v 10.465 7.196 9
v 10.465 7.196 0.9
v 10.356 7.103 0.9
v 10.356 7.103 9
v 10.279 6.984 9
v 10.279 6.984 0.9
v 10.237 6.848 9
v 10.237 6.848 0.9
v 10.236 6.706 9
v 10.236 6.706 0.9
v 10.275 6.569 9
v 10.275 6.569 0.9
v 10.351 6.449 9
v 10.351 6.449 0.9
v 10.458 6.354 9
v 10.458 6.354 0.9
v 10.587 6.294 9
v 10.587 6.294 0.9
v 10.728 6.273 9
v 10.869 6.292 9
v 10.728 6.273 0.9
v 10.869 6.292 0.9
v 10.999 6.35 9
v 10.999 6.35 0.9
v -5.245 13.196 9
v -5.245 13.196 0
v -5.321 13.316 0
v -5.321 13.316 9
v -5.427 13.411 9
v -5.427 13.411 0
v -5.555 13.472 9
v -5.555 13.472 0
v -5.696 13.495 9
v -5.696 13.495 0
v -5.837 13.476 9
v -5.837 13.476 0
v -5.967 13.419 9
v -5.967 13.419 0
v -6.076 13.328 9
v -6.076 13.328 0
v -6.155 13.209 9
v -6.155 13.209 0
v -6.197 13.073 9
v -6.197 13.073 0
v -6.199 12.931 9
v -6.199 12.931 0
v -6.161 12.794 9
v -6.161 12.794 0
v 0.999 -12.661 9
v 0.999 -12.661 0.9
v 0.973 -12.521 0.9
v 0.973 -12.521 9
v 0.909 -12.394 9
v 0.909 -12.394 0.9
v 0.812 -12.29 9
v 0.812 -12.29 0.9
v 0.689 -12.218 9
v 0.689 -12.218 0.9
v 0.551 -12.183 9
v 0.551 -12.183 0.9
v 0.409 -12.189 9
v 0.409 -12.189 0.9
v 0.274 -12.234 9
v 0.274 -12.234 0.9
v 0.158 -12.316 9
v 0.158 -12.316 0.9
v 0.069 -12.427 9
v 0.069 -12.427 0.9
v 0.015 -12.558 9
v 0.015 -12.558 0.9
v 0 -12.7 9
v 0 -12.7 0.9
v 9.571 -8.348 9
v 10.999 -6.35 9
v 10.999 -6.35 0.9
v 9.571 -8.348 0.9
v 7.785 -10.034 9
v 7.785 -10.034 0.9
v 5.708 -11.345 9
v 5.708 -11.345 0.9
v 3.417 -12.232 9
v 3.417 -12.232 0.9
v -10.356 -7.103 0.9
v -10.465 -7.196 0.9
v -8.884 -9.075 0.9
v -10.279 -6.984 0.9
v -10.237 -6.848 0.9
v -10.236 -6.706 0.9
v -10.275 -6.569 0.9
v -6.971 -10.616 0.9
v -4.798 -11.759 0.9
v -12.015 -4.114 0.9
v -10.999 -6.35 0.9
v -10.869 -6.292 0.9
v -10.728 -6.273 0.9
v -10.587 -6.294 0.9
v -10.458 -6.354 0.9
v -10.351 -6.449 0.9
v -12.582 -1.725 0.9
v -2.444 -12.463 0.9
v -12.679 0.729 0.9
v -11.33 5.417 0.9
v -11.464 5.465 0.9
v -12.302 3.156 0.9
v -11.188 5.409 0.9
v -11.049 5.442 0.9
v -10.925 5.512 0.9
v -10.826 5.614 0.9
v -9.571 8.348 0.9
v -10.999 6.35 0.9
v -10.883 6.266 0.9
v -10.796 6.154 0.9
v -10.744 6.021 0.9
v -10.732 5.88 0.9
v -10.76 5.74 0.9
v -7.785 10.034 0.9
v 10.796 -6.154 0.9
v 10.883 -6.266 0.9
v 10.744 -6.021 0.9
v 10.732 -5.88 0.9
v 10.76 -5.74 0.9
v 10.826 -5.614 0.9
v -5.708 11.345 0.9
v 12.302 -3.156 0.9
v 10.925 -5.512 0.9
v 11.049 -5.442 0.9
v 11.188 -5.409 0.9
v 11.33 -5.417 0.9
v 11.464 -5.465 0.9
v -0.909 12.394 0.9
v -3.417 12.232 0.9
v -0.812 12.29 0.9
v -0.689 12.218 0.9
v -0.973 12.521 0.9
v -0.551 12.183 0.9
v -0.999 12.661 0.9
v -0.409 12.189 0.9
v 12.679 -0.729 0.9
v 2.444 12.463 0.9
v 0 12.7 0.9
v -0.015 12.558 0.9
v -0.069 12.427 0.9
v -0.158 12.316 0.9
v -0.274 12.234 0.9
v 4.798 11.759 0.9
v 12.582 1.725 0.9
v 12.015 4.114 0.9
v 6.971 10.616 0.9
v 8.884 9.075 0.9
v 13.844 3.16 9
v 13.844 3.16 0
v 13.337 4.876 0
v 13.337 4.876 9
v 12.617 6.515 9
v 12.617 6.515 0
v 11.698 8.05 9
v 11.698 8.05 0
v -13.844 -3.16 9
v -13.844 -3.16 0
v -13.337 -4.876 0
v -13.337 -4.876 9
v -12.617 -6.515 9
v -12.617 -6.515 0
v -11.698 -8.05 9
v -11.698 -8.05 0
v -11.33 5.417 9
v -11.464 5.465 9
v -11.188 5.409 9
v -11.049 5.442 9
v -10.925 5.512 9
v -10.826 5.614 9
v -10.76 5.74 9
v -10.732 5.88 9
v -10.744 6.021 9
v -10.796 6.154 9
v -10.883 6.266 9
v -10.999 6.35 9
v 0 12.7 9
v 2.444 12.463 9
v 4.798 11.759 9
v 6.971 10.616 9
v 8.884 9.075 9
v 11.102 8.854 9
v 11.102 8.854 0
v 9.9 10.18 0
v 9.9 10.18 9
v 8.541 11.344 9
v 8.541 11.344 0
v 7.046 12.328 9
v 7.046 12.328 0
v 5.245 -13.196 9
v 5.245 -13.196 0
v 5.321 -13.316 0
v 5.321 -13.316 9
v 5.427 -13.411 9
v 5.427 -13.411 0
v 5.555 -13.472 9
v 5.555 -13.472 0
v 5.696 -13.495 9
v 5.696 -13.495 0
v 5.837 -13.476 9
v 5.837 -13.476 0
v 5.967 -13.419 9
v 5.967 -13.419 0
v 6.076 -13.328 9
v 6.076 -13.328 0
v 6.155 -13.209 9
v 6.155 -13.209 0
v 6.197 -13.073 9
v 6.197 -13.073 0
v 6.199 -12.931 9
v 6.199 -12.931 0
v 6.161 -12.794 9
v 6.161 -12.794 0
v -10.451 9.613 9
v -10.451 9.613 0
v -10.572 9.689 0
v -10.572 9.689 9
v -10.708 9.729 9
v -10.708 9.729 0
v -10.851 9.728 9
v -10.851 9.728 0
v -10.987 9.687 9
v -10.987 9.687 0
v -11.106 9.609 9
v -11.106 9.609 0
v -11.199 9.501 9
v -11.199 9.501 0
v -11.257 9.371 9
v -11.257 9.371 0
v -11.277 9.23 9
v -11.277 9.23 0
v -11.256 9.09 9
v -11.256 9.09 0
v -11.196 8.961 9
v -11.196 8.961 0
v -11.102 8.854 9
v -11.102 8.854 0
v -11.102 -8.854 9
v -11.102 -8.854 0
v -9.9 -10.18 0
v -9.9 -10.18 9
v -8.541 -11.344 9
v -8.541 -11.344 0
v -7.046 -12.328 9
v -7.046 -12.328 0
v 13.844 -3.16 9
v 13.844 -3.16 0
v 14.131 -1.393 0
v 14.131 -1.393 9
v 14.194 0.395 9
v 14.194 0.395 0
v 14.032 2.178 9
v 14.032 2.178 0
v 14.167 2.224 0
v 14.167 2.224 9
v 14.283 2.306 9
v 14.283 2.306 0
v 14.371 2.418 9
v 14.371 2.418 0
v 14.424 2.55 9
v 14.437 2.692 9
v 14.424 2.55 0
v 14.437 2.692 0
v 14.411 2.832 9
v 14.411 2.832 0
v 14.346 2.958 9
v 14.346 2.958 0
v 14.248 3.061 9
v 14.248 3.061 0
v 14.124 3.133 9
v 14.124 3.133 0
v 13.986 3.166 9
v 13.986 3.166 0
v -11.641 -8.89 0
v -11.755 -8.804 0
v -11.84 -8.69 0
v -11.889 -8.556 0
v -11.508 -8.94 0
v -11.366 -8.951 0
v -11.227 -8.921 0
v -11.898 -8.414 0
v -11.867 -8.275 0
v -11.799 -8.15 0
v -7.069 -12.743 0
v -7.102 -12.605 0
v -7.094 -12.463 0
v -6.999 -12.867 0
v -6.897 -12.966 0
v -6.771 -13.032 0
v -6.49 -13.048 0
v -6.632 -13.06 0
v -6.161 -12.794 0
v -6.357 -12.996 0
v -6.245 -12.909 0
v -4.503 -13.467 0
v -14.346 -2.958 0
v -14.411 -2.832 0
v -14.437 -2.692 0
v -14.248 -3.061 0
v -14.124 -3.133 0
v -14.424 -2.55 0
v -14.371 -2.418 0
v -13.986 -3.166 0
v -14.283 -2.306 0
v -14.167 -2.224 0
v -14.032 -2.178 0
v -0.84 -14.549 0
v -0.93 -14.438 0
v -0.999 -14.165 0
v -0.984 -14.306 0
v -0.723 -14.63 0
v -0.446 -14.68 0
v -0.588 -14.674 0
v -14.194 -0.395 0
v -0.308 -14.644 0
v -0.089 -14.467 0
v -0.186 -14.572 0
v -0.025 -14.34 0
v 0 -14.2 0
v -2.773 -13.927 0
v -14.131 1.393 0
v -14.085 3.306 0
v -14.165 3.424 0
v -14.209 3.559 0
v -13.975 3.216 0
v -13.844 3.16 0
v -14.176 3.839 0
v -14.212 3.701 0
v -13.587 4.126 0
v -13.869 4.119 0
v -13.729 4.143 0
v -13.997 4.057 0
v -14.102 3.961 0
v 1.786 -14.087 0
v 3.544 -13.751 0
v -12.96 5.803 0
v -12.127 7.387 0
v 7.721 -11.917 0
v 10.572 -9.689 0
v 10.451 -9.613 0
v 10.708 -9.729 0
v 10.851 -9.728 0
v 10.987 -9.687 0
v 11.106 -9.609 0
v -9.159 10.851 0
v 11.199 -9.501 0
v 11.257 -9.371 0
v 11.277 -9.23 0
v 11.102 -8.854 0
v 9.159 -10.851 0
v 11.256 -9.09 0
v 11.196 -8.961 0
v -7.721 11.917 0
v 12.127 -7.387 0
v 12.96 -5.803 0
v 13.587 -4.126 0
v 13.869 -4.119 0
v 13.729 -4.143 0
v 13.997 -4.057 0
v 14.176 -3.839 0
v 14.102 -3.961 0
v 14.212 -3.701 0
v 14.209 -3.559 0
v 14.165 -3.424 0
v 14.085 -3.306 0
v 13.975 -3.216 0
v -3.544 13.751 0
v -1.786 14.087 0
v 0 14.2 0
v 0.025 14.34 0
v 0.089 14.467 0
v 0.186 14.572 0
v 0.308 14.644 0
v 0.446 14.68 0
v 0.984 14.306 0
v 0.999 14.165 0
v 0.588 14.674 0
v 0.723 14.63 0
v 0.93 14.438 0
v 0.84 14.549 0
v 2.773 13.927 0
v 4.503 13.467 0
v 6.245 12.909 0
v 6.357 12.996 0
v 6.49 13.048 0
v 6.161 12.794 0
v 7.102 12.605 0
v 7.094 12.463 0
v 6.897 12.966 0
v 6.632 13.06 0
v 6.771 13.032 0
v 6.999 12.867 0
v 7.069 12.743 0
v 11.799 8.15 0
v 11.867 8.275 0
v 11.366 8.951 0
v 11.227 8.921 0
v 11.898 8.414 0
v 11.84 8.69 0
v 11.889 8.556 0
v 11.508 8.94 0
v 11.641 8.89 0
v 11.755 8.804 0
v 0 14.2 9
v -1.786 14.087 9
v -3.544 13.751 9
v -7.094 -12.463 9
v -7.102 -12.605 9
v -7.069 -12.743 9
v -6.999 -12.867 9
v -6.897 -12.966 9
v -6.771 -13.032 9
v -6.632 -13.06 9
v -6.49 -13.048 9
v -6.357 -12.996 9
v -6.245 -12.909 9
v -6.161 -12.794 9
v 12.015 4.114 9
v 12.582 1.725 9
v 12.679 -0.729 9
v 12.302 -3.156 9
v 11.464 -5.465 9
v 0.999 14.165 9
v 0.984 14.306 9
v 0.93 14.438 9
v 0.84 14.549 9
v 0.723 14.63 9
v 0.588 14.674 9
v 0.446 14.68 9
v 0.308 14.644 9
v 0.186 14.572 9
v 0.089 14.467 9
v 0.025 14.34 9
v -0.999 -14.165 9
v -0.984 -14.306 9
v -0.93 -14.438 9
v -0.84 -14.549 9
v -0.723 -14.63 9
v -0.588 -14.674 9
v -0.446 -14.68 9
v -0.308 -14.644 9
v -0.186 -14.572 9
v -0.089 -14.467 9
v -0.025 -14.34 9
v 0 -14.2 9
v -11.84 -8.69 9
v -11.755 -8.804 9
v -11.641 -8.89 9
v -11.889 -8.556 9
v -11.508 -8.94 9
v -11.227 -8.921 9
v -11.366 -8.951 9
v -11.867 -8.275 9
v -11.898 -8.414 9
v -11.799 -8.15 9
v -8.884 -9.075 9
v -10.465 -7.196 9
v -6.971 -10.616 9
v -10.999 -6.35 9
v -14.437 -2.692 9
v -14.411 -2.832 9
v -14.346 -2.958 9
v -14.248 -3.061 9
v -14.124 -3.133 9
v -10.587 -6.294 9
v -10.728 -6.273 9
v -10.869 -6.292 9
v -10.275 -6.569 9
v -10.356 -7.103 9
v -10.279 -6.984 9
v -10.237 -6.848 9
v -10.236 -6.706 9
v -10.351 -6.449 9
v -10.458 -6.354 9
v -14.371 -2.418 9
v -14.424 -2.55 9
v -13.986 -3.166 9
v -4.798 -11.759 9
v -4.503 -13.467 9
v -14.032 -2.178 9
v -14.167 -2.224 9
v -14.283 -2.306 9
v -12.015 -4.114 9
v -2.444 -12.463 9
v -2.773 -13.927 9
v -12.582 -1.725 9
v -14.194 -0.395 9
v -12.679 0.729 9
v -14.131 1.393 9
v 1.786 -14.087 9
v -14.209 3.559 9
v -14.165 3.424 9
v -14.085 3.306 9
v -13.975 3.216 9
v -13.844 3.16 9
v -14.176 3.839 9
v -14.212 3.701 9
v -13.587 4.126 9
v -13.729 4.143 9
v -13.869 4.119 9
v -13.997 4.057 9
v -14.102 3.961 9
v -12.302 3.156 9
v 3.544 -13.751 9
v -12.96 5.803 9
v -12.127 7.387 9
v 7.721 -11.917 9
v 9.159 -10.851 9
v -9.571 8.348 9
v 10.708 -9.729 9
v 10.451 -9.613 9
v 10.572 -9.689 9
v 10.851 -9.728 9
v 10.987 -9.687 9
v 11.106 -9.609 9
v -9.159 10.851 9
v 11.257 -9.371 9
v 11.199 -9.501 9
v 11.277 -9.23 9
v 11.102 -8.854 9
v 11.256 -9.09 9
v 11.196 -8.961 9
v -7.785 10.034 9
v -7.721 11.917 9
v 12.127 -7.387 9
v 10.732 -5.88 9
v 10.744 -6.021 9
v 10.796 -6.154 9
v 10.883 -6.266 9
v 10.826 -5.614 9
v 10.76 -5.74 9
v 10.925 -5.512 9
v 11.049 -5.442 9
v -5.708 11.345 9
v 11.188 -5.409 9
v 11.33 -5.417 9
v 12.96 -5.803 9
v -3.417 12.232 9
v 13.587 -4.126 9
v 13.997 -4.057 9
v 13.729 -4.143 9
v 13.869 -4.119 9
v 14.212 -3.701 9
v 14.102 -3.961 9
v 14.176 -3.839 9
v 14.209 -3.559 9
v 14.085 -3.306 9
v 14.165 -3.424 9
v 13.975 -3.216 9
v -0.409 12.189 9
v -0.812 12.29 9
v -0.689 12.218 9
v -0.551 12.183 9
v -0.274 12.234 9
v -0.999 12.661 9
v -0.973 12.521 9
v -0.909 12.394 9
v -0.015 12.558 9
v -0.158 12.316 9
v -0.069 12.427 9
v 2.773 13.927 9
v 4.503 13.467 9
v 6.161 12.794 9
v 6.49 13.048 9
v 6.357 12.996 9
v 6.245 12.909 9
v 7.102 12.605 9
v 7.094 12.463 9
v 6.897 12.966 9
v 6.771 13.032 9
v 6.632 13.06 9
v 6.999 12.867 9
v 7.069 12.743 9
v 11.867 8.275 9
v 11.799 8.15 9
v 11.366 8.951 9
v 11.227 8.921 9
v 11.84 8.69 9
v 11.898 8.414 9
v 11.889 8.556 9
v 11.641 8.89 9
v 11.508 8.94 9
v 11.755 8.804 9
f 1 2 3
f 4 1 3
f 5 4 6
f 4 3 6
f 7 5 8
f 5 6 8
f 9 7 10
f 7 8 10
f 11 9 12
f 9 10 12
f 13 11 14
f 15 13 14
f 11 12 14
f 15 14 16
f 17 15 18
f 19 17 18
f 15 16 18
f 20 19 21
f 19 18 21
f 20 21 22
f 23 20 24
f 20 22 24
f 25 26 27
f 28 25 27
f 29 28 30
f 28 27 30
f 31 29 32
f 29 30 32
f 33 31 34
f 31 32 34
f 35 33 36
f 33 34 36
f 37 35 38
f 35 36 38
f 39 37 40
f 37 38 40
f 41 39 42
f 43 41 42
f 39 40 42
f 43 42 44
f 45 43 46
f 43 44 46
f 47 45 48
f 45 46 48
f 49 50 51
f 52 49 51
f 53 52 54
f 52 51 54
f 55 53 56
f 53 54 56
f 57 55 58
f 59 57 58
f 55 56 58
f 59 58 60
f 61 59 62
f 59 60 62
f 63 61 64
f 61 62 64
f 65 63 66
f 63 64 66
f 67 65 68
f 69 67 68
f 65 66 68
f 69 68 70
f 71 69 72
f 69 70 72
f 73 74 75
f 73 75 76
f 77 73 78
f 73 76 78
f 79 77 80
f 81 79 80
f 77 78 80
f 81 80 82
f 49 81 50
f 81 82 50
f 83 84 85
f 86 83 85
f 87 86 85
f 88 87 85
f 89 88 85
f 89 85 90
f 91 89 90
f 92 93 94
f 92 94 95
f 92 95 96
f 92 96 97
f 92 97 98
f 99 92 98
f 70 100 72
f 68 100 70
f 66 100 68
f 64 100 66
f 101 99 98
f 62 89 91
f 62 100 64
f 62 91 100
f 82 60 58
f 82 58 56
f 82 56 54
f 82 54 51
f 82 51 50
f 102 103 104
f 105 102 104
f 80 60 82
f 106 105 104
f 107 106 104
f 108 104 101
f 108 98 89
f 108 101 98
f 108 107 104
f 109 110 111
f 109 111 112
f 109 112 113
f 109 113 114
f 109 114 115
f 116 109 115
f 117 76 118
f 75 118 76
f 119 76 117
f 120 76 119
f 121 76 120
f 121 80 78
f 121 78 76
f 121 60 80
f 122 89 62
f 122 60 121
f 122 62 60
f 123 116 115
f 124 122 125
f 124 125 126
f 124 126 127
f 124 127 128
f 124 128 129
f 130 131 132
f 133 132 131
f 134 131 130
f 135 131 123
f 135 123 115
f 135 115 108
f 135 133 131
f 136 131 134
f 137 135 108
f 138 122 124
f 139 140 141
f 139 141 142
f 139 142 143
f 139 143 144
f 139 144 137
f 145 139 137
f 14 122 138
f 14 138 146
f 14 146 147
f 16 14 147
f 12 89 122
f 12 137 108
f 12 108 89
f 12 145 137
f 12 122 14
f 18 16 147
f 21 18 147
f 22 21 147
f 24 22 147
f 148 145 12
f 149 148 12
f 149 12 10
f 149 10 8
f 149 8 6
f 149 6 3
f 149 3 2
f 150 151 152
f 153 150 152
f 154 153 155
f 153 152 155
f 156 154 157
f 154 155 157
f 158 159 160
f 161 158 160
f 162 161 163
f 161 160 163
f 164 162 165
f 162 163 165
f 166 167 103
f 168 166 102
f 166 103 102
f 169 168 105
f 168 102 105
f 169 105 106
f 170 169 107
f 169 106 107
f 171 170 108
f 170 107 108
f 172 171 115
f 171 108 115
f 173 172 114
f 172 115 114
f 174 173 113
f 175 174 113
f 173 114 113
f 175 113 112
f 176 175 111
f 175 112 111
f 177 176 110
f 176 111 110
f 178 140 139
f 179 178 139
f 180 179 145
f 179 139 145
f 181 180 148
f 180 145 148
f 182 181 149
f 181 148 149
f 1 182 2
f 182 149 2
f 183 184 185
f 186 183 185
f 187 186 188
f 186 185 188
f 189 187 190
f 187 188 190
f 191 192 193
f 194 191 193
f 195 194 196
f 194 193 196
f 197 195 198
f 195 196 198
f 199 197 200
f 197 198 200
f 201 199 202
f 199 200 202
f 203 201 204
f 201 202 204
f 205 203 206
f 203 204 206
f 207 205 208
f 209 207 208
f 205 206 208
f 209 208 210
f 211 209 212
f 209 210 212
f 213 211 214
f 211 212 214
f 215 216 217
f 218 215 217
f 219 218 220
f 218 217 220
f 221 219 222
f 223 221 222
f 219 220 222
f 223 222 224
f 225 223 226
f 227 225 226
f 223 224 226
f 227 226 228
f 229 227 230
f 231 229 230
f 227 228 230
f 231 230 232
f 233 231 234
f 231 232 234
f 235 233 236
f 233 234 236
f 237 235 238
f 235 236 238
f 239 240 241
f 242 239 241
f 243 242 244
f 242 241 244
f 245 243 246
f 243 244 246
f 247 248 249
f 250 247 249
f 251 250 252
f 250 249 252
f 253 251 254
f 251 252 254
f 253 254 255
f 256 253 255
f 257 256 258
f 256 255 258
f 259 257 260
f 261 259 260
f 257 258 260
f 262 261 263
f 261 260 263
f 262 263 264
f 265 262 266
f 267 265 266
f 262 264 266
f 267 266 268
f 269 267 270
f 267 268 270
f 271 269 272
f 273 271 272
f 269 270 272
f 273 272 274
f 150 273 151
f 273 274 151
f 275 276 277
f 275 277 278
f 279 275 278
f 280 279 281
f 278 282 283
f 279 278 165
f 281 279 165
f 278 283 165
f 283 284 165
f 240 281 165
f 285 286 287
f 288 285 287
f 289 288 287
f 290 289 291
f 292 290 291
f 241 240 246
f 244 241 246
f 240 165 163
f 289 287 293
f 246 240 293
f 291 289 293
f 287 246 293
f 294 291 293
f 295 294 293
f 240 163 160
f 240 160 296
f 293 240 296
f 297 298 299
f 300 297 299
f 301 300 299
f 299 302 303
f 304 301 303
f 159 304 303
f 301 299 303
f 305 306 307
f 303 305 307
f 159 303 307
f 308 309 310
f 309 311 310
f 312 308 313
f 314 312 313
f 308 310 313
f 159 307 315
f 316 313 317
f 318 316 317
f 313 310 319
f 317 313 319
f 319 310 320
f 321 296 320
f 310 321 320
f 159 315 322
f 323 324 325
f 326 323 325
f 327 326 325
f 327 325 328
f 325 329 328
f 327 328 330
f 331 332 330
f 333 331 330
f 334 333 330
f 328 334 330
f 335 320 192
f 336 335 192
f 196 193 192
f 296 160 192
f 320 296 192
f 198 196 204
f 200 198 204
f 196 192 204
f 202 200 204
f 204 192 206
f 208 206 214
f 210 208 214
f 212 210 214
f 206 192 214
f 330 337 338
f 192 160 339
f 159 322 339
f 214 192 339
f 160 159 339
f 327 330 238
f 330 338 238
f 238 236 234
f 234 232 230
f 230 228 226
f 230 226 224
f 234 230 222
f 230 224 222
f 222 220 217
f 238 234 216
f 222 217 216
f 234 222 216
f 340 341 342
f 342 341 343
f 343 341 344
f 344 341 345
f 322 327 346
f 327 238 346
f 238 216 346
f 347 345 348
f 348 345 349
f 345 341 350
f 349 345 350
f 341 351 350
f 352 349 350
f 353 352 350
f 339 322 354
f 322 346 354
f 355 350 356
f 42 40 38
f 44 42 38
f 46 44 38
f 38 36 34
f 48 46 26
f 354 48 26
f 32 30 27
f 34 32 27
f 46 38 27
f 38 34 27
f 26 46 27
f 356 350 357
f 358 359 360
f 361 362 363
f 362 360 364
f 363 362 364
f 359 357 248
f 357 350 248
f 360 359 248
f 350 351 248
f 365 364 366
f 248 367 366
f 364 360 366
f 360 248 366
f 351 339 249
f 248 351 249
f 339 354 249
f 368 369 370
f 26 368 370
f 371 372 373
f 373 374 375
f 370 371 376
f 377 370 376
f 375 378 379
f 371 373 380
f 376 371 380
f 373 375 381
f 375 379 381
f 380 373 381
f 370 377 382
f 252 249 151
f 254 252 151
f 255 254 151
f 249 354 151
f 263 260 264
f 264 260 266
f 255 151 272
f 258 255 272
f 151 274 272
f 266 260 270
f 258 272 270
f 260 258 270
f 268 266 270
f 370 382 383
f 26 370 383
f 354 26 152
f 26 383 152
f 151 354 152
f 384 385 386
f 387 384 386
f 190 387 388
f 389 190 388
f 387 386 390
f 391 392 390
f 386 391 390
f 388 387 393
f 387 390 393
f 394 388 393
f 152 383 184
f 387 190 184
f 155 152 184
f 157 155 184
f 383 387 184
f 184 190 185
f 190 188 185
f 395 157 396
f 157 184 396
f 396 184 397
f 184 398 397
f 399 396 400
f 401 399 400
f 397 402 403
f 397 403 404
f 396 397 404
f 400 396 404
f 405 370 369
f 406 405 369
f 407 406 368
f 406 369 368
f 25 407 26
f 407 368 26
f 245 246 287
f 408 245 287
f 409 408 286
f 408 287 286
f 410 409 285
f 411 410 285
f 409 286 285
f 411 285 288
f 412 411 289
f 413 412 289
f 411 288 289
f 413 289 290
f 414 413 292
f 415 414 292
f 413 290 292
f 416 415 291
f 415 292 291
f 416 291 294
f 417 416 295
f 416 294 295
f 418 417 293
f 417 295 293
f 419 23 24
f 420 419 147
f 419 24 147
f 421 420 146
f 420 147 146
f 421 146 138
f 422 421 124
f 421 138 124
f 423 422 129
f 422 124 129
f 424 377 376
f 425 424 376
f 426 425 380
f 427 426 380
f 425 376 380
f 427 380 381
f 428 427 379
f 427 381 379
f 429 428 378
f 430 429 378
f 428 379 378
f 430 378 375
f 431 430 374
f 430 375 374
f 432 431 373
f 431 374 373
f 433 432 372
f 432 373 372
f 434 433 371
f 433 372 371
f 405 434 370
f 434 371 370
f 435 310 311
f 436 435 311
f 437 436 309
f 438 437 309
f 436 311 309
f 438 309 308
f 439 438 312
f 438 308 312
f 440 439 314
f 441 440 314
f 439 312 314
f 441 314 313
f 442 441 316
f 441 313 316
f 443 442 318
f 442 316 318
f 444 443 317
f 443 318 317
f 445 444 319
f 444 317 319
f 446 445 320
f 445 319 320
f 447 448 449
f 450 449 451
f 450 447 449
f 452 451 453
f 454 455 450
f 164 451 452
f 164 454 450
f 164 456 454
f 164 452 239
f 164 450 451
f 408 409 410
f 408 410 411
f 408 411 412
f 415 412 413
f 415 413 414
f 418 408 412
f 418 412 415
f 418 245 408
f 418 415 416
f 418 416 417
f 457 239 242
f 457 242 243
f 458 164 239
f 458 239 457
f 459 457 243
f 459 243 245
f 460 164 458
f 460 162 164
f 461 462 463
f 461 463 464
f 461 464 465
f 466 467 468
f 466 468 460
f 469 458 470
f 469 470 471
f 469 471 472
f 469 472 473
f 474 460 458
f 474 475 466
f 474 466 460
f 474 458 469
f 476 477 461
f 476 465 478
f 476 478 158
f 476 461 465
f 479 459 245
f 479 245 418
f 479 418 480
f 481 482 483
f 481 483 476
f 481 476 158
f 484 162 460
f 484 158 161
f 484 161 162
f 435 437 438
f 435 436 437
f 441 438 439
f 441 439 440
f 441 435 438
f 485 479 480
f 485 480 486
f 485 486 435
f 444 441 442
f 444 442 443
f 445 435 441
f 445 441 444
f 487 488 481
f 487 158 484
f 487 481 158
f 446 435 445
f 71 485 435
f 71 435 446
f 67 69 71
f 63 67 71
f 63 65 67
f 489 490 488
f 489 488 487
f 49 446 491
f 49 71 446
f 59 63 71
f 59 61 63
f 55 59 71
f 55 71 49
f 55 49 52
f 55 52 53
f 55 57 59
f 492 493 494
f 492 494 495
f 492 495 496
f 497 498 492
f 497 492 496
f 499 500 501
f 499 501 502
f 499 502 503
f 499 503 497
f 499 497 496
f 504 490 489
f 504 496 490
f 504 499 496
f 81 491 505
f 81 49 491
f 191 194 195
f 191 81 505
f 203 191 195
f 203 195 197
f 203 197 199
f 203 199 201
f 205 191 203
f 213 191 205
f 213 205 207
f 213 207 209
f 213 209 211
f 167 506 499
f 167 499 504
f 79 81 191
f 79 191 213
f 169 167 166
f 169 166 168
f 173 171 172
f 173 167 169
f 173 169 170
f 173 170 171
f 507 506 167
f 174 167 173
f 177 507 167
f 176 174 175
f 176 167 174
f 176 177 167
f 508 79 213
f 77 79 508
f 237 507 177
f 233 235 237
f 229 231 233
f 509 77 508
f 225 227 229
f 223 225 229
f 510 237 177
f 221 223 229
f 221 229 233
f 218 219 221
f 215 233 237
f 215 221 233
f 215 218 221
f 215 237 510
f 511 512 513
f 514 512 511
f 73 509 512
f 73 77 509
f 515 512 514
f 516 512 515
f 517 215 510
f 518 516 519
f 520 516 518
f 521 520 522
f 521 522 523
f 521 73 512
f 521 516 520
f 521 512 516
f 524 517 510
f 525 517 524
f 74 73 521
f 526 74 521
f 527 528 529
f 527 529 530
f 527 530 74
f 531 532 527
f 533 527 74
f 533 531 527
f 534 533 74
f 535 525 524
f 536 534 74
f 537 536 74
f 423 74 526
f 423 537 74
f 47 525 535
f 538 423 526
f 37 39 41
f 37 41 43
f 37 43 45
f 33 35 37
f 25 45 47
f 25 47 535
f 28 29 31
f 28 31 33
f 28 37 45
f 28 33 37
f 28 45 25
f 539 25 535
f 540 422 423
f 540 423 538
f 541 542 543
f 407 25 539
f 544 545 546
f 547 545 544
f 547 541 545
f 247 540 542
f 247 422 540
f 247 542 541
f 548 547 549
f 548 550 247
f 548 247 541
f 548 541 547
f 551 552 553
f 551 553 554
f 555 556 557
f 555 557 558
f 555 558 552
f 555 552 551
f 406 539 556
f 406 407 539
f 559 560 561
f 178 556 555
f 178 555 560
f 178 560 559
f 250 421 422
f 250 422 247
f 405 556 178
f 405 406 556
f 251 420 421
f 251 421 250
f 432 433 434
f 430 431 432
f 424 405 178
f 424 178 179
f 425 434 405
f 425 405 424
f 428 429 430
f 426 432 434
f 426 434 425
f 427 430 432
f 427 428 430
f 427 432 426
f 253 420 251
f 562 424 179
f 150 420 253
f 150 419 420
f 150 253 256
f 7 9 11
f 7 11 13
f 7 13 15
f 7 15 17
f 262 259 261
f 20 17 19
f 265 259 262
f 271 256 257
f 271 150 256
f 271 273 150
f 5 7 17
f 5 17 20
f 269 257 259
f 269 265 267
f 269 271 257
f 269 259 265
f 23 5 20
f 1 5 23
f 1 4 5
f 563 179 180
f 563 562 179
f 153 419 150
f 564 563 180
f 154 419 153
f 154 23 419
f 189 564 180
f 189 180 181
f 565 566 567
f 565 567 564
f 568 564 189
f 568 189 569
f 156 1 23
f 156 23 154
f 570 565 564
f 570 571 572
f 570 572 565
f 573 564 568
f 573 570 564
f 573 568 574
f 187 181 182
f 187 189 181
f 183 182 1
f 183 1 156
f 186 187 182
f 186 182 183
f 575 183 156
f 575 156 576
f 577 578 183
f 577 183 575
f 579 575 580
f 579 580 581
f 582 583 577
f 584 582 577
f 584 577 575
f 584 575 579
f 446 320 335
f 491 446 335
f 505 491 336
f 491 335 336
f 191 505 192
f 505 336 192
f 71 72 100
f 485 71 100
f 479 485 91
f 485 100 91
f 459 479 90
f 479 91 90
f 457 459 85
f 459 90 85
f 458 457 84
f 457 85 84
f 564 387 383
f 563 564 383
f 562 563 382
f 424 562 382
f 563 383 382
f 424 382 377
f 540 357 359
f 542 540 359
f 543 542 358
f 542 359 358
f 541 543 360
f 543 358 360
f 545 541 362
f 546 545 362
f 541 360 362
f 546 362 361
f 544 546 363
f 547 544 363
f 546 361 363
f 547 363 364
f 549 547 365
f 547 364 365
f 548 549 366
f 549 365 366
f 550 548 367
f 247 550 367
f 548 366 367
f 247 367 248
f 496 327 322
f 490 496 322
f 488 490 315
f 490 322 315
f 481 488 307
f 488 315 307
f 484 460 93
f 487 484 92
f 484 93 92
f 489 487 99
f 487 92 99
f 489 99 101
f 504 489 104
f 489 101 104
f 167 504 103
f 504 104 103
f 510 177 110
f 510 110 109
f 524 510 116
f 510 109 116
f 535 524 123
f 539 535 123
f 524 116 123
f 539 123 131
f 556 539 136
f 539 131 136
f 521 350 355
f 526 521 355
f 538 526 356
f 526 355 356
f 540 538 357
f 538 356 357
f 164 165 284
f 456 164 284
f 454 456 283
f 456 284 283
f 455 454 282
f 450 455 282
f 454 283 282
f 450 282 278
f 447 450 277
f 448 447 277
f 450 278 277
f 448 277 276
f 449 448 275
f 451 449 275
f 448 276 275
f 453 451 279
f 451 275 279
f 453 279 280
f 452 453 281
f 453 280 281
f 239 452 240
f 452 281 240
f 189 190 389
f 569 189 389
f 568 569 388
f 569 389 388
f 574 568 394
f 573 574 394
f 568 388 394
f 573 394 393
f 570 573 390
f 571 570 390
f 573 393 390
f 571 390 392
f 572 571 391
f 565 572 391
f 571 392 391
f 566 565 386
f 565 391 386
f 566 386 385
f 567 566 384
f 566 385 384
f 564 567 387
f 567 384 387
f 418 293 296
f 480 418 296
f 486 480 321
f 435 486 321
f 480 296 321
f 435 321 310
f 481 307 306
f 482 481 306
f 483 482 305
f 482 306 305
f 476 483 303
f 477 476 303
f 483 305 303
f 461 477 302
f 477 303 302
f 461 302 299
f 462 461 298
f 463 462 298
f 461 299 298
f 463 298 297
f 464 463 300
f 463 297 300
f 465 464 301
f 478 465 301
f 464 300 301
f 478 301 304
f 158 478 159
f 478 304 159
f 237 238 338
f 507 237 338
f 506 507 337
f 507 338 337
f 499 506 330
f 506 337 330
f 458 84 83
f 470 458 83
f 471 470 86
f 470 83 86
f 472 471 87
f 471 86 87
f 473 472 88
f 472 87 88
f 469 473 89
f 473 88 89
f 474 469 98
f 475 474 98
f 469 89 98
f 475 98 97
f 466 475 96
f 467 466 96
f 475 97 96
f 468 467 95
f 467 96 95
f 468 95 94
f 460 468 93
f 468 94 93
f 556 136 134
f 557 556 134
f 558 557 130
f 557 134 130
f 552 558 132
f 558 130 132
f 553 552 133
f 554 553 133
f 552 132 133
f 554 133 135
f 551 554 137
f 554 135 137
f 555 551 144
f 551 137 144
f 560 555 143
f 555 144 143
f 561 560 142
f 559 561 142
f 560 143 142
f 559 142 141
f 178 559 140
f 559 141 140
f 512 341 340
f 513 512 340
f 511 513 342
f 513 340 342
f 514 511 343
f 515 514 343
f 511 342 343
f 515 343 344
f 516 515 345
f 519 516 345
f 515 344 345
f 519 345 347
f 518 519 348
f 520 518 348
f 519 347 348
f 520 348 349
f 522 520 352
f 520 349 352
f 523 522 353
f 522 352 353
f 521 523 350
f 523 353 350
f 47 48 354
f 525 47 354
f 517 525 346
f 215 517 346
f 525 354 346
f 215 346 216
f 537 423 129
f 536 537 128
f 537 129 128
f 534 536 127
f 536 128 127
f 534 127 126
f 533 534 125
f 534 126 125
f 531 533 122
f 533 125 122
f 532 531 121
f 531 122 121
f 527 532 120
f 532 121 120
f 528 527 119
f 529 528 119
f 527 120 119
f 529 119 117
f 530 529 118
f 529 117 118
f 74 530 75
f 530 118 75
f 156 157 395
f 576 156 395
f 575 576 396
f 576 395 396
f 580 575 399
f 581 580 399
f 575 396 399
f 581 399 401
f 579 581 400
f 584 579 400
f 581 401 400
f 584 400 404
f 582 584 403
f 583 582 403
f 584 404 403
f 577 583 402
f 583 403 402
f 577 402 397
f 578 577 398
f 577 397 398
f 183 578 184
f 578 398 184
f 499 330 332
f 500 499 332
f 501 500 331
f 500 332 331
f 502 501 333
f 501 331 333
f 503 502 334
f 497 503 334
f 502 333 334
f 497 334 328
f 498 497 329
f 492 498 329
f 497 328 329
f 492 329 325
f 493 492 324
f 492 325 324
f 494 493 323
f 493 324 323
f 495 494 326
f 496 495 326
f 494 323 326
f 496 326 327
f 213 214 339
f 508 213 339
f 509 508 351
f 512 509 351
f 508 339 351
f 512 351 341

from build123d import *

# Parameters (mm, degrees)
F1_DEPTH = 0.9
F2_DEPTH = 9


with BuildPart() as f1:
    # F0 (on Top) → F1 (new body)
    with BuildSketch(Plane.XY):
        with BuildLine():
            ThreePointArc((0, 12.7), (-0.479927, 12.180703), (-0.999225, 12.66063))
            ThreePointArc((-0.999225, 12.66063), (-6.77809, 10.739995), (-10.998523, 6.35))
            ThreePointArc((-10.998523, 6.35), (-10.788762, 5.674722), (-11.464039, 5.464961))
            ThreePointArc((-11.464039, 5.464961), (-12.690154, -0.5), (-10.998523, -6.35))
            ThreePointArc((-10.998523, -6.35), (-10.308834, -6.505981), (-10.464815, -7.195669))
            ThreePointArc((-10.464815, -7.195669), (-5.912064, -11.239995), (0, -12.7))
            ThreePointArc((0, -12.7), (0.479927, -12.180703), (0.999225, -12.66063))
            ThreePointArc((0.999225, -12.66063), (6.77809, -10.739995), (10.998523, -6.35))
            ThreePointArc((10.998523, -6.35), (10.788762, -5.674722), (11.464039, -5.464961))
            ThreePointArc((11.464039, -5.464961), (12.690154, 0.5), (10.998523, 6.35))
            ThreePointArc((10.998523, 6.35), (10.308834, 6.505981), (10.464815, 7.195669))
            ThreePointArc((10.464815, 7.195669), (5.912064, 11.239995), (0, 12.7))
        make_face()
    extrude(amount=F1_DEPTH)

    # F0 (on Top) → F2 (join)
    with BuildSketch(Plane.XY):
        with BuildLine():
            ThreePointArc((0.99938, 14.164789), (0.517296, 14.682084), (0, 14.2))
            ThreePointArc((0, 14.2), (-2.670374, 13.946652), (-5.245461, 13.195648))
            ThreePointArc((-5.245461, 13.195648), (-5.90425, 13.452547), (-6.161149, 12.793758))
            ThreePointArc((-6.161149, 12.793758), (-8.457149, 11.406867), (-10.451375, 9.612948))
            ThreePointArc((-10.451375, 9.612948), (-11.156387, 9.558568), (-11.102007, 8.853555))
            ThreePointArc((-11.102007, 8.853555), (-12.568883, 6.607813), (-13.587265, 4.126285))
            ThreePointArc((-13.587265, 4.126285), (-14.198865, 3.771397), (-13.843976, 3.159797))
            ThreePointArc((-13.843976, 3.159797), (-14.191194, 0.5), (-14.032031, -2.177639))
            ThreePointArc((-14.032031, -2.177639), (-14.429083, -2.762745), (-13.843976, -3.159797))
            ThreePointArc((-13.843976, -3.159797), (-13.002766, -5.706844), (-11.697581, -8.050255))
            ThreePointArc((-11.697581, -8.050255), (-11.801444, -8.749692), (-11.102007, -8.853555))
            ThreePointArc((-11.102007, -8.853555), (-9.238981, -10.783378), (-7.046282, -12.328419))
            ThreePointArc((-7.046282, -12.328419), (-6.836385, -13.003655), (-6.161149, -12.793758))
            ThreePointArc((-6.161149, -12.793758), (-3.645302, -13.724131), (-0.99938, -14.164789))
            ThreePointArc((-0.99938, -14.164789), (-0.517296, -14.682084), (0, -14.2))
            ThreePointArc((0, -14.2), (2.670374, -13.946652), (5.245461, -13.195648))
            ThreePointArc((5.245461, -13.195648), (5.90425, -13.452547), (6.161149, -12.793758))
            ThreePointArc((6.161149, -12.793758), (8.457149, -11.406867), (10.451375, -9.612948))
            ThreePointArc((10.451375, -9.612948), (11.156387, -9.558568), (11.102007, -8.853555))
            ThreePointArc((11.102007, -8.853555), (12.568883, -6.607813), (13.587265, -4.126285))
            ThreePointArc((13.587265, -4.126285), (14.198865, -3.771397), (13.843976, -3.159797))
            ThreePointArc((13.843976, -3.159797), (14.191194, -0.5), (14.032031, 2.177639))
            ThreePointArc((14.032031, 2.177639), (14.429083, 2.762745), (13.843976, 3.159797))
            ThreePointArc((13.843976, 3.159797), (13.002766, 5.706844), (11.697581, 8.050255))
            ThreePointArc((11.697581, 8.050255), (11.801444, 8.749692), (11.102007, 8.853555))
            ThreePointArc((11.102007, 8.853555), (9.238981, 10.783378), (7.046282, 12.328419))
            ThreePointArc((7.046282, 12.328419), (6.836385, 13.003655), (6.161149, 12.793758))
            ThreePointArc((6.161149, 12.793758), (3.645302, 13.724131), (0.99938, 14.164789))
        make_face()
        with BuildLine():
            ThreePointArc((-10.998523, 6.35), (-6.77809, 10.739995), (-0.999225, 12.66063))
            ThreePointArc((-0.999225, 12.66063), (-0.479927, 12.180703), (0, 12.7))
            ThreePointArc((0, 12.7), (5.912064, 11.239995), (10.464815, 7.195669))
            ThreePointArc((10.464815, 7.195669), (10.308834, 6.505981), (10.998523, 6.35))
            ThreePointArc((10.998523, 6.35), (12.690154, 0.5), (11.464039, -5.464961))
            ThreePointArc((11.464039, -5.464961), (10.788762, -5.674722), (10.998523, -6.35))
            ThreePointArc((10.998523, -6.35), (6.77809, -10.739995), (0.999225, -12.66063))
            ThreePointArc((0.999225, -12.66063), (0.479927, -12.180703), (0, -12.7))
            ThreePointArc((0, -12.7), (-5.912064, -11.239995), (-10.464815, -7.195669))
            ThreePointArc((-10.464815, -7.195669), (-10.308834, -6.505981), (-10.998523, -6.35))
            ThreePointArc((-10.998523, -6.35), (-12.690154, -0.5), (-11.464039, 5.464961))
            ThreePointArc((-11.464039, 5.464961), (-10.788762, 5.674722), (-10.998523, 6.35))
        make_face(mode=Mode.SUBTRACT)
    extrude(amount=F2_DEPTH)


solid = f1.part
